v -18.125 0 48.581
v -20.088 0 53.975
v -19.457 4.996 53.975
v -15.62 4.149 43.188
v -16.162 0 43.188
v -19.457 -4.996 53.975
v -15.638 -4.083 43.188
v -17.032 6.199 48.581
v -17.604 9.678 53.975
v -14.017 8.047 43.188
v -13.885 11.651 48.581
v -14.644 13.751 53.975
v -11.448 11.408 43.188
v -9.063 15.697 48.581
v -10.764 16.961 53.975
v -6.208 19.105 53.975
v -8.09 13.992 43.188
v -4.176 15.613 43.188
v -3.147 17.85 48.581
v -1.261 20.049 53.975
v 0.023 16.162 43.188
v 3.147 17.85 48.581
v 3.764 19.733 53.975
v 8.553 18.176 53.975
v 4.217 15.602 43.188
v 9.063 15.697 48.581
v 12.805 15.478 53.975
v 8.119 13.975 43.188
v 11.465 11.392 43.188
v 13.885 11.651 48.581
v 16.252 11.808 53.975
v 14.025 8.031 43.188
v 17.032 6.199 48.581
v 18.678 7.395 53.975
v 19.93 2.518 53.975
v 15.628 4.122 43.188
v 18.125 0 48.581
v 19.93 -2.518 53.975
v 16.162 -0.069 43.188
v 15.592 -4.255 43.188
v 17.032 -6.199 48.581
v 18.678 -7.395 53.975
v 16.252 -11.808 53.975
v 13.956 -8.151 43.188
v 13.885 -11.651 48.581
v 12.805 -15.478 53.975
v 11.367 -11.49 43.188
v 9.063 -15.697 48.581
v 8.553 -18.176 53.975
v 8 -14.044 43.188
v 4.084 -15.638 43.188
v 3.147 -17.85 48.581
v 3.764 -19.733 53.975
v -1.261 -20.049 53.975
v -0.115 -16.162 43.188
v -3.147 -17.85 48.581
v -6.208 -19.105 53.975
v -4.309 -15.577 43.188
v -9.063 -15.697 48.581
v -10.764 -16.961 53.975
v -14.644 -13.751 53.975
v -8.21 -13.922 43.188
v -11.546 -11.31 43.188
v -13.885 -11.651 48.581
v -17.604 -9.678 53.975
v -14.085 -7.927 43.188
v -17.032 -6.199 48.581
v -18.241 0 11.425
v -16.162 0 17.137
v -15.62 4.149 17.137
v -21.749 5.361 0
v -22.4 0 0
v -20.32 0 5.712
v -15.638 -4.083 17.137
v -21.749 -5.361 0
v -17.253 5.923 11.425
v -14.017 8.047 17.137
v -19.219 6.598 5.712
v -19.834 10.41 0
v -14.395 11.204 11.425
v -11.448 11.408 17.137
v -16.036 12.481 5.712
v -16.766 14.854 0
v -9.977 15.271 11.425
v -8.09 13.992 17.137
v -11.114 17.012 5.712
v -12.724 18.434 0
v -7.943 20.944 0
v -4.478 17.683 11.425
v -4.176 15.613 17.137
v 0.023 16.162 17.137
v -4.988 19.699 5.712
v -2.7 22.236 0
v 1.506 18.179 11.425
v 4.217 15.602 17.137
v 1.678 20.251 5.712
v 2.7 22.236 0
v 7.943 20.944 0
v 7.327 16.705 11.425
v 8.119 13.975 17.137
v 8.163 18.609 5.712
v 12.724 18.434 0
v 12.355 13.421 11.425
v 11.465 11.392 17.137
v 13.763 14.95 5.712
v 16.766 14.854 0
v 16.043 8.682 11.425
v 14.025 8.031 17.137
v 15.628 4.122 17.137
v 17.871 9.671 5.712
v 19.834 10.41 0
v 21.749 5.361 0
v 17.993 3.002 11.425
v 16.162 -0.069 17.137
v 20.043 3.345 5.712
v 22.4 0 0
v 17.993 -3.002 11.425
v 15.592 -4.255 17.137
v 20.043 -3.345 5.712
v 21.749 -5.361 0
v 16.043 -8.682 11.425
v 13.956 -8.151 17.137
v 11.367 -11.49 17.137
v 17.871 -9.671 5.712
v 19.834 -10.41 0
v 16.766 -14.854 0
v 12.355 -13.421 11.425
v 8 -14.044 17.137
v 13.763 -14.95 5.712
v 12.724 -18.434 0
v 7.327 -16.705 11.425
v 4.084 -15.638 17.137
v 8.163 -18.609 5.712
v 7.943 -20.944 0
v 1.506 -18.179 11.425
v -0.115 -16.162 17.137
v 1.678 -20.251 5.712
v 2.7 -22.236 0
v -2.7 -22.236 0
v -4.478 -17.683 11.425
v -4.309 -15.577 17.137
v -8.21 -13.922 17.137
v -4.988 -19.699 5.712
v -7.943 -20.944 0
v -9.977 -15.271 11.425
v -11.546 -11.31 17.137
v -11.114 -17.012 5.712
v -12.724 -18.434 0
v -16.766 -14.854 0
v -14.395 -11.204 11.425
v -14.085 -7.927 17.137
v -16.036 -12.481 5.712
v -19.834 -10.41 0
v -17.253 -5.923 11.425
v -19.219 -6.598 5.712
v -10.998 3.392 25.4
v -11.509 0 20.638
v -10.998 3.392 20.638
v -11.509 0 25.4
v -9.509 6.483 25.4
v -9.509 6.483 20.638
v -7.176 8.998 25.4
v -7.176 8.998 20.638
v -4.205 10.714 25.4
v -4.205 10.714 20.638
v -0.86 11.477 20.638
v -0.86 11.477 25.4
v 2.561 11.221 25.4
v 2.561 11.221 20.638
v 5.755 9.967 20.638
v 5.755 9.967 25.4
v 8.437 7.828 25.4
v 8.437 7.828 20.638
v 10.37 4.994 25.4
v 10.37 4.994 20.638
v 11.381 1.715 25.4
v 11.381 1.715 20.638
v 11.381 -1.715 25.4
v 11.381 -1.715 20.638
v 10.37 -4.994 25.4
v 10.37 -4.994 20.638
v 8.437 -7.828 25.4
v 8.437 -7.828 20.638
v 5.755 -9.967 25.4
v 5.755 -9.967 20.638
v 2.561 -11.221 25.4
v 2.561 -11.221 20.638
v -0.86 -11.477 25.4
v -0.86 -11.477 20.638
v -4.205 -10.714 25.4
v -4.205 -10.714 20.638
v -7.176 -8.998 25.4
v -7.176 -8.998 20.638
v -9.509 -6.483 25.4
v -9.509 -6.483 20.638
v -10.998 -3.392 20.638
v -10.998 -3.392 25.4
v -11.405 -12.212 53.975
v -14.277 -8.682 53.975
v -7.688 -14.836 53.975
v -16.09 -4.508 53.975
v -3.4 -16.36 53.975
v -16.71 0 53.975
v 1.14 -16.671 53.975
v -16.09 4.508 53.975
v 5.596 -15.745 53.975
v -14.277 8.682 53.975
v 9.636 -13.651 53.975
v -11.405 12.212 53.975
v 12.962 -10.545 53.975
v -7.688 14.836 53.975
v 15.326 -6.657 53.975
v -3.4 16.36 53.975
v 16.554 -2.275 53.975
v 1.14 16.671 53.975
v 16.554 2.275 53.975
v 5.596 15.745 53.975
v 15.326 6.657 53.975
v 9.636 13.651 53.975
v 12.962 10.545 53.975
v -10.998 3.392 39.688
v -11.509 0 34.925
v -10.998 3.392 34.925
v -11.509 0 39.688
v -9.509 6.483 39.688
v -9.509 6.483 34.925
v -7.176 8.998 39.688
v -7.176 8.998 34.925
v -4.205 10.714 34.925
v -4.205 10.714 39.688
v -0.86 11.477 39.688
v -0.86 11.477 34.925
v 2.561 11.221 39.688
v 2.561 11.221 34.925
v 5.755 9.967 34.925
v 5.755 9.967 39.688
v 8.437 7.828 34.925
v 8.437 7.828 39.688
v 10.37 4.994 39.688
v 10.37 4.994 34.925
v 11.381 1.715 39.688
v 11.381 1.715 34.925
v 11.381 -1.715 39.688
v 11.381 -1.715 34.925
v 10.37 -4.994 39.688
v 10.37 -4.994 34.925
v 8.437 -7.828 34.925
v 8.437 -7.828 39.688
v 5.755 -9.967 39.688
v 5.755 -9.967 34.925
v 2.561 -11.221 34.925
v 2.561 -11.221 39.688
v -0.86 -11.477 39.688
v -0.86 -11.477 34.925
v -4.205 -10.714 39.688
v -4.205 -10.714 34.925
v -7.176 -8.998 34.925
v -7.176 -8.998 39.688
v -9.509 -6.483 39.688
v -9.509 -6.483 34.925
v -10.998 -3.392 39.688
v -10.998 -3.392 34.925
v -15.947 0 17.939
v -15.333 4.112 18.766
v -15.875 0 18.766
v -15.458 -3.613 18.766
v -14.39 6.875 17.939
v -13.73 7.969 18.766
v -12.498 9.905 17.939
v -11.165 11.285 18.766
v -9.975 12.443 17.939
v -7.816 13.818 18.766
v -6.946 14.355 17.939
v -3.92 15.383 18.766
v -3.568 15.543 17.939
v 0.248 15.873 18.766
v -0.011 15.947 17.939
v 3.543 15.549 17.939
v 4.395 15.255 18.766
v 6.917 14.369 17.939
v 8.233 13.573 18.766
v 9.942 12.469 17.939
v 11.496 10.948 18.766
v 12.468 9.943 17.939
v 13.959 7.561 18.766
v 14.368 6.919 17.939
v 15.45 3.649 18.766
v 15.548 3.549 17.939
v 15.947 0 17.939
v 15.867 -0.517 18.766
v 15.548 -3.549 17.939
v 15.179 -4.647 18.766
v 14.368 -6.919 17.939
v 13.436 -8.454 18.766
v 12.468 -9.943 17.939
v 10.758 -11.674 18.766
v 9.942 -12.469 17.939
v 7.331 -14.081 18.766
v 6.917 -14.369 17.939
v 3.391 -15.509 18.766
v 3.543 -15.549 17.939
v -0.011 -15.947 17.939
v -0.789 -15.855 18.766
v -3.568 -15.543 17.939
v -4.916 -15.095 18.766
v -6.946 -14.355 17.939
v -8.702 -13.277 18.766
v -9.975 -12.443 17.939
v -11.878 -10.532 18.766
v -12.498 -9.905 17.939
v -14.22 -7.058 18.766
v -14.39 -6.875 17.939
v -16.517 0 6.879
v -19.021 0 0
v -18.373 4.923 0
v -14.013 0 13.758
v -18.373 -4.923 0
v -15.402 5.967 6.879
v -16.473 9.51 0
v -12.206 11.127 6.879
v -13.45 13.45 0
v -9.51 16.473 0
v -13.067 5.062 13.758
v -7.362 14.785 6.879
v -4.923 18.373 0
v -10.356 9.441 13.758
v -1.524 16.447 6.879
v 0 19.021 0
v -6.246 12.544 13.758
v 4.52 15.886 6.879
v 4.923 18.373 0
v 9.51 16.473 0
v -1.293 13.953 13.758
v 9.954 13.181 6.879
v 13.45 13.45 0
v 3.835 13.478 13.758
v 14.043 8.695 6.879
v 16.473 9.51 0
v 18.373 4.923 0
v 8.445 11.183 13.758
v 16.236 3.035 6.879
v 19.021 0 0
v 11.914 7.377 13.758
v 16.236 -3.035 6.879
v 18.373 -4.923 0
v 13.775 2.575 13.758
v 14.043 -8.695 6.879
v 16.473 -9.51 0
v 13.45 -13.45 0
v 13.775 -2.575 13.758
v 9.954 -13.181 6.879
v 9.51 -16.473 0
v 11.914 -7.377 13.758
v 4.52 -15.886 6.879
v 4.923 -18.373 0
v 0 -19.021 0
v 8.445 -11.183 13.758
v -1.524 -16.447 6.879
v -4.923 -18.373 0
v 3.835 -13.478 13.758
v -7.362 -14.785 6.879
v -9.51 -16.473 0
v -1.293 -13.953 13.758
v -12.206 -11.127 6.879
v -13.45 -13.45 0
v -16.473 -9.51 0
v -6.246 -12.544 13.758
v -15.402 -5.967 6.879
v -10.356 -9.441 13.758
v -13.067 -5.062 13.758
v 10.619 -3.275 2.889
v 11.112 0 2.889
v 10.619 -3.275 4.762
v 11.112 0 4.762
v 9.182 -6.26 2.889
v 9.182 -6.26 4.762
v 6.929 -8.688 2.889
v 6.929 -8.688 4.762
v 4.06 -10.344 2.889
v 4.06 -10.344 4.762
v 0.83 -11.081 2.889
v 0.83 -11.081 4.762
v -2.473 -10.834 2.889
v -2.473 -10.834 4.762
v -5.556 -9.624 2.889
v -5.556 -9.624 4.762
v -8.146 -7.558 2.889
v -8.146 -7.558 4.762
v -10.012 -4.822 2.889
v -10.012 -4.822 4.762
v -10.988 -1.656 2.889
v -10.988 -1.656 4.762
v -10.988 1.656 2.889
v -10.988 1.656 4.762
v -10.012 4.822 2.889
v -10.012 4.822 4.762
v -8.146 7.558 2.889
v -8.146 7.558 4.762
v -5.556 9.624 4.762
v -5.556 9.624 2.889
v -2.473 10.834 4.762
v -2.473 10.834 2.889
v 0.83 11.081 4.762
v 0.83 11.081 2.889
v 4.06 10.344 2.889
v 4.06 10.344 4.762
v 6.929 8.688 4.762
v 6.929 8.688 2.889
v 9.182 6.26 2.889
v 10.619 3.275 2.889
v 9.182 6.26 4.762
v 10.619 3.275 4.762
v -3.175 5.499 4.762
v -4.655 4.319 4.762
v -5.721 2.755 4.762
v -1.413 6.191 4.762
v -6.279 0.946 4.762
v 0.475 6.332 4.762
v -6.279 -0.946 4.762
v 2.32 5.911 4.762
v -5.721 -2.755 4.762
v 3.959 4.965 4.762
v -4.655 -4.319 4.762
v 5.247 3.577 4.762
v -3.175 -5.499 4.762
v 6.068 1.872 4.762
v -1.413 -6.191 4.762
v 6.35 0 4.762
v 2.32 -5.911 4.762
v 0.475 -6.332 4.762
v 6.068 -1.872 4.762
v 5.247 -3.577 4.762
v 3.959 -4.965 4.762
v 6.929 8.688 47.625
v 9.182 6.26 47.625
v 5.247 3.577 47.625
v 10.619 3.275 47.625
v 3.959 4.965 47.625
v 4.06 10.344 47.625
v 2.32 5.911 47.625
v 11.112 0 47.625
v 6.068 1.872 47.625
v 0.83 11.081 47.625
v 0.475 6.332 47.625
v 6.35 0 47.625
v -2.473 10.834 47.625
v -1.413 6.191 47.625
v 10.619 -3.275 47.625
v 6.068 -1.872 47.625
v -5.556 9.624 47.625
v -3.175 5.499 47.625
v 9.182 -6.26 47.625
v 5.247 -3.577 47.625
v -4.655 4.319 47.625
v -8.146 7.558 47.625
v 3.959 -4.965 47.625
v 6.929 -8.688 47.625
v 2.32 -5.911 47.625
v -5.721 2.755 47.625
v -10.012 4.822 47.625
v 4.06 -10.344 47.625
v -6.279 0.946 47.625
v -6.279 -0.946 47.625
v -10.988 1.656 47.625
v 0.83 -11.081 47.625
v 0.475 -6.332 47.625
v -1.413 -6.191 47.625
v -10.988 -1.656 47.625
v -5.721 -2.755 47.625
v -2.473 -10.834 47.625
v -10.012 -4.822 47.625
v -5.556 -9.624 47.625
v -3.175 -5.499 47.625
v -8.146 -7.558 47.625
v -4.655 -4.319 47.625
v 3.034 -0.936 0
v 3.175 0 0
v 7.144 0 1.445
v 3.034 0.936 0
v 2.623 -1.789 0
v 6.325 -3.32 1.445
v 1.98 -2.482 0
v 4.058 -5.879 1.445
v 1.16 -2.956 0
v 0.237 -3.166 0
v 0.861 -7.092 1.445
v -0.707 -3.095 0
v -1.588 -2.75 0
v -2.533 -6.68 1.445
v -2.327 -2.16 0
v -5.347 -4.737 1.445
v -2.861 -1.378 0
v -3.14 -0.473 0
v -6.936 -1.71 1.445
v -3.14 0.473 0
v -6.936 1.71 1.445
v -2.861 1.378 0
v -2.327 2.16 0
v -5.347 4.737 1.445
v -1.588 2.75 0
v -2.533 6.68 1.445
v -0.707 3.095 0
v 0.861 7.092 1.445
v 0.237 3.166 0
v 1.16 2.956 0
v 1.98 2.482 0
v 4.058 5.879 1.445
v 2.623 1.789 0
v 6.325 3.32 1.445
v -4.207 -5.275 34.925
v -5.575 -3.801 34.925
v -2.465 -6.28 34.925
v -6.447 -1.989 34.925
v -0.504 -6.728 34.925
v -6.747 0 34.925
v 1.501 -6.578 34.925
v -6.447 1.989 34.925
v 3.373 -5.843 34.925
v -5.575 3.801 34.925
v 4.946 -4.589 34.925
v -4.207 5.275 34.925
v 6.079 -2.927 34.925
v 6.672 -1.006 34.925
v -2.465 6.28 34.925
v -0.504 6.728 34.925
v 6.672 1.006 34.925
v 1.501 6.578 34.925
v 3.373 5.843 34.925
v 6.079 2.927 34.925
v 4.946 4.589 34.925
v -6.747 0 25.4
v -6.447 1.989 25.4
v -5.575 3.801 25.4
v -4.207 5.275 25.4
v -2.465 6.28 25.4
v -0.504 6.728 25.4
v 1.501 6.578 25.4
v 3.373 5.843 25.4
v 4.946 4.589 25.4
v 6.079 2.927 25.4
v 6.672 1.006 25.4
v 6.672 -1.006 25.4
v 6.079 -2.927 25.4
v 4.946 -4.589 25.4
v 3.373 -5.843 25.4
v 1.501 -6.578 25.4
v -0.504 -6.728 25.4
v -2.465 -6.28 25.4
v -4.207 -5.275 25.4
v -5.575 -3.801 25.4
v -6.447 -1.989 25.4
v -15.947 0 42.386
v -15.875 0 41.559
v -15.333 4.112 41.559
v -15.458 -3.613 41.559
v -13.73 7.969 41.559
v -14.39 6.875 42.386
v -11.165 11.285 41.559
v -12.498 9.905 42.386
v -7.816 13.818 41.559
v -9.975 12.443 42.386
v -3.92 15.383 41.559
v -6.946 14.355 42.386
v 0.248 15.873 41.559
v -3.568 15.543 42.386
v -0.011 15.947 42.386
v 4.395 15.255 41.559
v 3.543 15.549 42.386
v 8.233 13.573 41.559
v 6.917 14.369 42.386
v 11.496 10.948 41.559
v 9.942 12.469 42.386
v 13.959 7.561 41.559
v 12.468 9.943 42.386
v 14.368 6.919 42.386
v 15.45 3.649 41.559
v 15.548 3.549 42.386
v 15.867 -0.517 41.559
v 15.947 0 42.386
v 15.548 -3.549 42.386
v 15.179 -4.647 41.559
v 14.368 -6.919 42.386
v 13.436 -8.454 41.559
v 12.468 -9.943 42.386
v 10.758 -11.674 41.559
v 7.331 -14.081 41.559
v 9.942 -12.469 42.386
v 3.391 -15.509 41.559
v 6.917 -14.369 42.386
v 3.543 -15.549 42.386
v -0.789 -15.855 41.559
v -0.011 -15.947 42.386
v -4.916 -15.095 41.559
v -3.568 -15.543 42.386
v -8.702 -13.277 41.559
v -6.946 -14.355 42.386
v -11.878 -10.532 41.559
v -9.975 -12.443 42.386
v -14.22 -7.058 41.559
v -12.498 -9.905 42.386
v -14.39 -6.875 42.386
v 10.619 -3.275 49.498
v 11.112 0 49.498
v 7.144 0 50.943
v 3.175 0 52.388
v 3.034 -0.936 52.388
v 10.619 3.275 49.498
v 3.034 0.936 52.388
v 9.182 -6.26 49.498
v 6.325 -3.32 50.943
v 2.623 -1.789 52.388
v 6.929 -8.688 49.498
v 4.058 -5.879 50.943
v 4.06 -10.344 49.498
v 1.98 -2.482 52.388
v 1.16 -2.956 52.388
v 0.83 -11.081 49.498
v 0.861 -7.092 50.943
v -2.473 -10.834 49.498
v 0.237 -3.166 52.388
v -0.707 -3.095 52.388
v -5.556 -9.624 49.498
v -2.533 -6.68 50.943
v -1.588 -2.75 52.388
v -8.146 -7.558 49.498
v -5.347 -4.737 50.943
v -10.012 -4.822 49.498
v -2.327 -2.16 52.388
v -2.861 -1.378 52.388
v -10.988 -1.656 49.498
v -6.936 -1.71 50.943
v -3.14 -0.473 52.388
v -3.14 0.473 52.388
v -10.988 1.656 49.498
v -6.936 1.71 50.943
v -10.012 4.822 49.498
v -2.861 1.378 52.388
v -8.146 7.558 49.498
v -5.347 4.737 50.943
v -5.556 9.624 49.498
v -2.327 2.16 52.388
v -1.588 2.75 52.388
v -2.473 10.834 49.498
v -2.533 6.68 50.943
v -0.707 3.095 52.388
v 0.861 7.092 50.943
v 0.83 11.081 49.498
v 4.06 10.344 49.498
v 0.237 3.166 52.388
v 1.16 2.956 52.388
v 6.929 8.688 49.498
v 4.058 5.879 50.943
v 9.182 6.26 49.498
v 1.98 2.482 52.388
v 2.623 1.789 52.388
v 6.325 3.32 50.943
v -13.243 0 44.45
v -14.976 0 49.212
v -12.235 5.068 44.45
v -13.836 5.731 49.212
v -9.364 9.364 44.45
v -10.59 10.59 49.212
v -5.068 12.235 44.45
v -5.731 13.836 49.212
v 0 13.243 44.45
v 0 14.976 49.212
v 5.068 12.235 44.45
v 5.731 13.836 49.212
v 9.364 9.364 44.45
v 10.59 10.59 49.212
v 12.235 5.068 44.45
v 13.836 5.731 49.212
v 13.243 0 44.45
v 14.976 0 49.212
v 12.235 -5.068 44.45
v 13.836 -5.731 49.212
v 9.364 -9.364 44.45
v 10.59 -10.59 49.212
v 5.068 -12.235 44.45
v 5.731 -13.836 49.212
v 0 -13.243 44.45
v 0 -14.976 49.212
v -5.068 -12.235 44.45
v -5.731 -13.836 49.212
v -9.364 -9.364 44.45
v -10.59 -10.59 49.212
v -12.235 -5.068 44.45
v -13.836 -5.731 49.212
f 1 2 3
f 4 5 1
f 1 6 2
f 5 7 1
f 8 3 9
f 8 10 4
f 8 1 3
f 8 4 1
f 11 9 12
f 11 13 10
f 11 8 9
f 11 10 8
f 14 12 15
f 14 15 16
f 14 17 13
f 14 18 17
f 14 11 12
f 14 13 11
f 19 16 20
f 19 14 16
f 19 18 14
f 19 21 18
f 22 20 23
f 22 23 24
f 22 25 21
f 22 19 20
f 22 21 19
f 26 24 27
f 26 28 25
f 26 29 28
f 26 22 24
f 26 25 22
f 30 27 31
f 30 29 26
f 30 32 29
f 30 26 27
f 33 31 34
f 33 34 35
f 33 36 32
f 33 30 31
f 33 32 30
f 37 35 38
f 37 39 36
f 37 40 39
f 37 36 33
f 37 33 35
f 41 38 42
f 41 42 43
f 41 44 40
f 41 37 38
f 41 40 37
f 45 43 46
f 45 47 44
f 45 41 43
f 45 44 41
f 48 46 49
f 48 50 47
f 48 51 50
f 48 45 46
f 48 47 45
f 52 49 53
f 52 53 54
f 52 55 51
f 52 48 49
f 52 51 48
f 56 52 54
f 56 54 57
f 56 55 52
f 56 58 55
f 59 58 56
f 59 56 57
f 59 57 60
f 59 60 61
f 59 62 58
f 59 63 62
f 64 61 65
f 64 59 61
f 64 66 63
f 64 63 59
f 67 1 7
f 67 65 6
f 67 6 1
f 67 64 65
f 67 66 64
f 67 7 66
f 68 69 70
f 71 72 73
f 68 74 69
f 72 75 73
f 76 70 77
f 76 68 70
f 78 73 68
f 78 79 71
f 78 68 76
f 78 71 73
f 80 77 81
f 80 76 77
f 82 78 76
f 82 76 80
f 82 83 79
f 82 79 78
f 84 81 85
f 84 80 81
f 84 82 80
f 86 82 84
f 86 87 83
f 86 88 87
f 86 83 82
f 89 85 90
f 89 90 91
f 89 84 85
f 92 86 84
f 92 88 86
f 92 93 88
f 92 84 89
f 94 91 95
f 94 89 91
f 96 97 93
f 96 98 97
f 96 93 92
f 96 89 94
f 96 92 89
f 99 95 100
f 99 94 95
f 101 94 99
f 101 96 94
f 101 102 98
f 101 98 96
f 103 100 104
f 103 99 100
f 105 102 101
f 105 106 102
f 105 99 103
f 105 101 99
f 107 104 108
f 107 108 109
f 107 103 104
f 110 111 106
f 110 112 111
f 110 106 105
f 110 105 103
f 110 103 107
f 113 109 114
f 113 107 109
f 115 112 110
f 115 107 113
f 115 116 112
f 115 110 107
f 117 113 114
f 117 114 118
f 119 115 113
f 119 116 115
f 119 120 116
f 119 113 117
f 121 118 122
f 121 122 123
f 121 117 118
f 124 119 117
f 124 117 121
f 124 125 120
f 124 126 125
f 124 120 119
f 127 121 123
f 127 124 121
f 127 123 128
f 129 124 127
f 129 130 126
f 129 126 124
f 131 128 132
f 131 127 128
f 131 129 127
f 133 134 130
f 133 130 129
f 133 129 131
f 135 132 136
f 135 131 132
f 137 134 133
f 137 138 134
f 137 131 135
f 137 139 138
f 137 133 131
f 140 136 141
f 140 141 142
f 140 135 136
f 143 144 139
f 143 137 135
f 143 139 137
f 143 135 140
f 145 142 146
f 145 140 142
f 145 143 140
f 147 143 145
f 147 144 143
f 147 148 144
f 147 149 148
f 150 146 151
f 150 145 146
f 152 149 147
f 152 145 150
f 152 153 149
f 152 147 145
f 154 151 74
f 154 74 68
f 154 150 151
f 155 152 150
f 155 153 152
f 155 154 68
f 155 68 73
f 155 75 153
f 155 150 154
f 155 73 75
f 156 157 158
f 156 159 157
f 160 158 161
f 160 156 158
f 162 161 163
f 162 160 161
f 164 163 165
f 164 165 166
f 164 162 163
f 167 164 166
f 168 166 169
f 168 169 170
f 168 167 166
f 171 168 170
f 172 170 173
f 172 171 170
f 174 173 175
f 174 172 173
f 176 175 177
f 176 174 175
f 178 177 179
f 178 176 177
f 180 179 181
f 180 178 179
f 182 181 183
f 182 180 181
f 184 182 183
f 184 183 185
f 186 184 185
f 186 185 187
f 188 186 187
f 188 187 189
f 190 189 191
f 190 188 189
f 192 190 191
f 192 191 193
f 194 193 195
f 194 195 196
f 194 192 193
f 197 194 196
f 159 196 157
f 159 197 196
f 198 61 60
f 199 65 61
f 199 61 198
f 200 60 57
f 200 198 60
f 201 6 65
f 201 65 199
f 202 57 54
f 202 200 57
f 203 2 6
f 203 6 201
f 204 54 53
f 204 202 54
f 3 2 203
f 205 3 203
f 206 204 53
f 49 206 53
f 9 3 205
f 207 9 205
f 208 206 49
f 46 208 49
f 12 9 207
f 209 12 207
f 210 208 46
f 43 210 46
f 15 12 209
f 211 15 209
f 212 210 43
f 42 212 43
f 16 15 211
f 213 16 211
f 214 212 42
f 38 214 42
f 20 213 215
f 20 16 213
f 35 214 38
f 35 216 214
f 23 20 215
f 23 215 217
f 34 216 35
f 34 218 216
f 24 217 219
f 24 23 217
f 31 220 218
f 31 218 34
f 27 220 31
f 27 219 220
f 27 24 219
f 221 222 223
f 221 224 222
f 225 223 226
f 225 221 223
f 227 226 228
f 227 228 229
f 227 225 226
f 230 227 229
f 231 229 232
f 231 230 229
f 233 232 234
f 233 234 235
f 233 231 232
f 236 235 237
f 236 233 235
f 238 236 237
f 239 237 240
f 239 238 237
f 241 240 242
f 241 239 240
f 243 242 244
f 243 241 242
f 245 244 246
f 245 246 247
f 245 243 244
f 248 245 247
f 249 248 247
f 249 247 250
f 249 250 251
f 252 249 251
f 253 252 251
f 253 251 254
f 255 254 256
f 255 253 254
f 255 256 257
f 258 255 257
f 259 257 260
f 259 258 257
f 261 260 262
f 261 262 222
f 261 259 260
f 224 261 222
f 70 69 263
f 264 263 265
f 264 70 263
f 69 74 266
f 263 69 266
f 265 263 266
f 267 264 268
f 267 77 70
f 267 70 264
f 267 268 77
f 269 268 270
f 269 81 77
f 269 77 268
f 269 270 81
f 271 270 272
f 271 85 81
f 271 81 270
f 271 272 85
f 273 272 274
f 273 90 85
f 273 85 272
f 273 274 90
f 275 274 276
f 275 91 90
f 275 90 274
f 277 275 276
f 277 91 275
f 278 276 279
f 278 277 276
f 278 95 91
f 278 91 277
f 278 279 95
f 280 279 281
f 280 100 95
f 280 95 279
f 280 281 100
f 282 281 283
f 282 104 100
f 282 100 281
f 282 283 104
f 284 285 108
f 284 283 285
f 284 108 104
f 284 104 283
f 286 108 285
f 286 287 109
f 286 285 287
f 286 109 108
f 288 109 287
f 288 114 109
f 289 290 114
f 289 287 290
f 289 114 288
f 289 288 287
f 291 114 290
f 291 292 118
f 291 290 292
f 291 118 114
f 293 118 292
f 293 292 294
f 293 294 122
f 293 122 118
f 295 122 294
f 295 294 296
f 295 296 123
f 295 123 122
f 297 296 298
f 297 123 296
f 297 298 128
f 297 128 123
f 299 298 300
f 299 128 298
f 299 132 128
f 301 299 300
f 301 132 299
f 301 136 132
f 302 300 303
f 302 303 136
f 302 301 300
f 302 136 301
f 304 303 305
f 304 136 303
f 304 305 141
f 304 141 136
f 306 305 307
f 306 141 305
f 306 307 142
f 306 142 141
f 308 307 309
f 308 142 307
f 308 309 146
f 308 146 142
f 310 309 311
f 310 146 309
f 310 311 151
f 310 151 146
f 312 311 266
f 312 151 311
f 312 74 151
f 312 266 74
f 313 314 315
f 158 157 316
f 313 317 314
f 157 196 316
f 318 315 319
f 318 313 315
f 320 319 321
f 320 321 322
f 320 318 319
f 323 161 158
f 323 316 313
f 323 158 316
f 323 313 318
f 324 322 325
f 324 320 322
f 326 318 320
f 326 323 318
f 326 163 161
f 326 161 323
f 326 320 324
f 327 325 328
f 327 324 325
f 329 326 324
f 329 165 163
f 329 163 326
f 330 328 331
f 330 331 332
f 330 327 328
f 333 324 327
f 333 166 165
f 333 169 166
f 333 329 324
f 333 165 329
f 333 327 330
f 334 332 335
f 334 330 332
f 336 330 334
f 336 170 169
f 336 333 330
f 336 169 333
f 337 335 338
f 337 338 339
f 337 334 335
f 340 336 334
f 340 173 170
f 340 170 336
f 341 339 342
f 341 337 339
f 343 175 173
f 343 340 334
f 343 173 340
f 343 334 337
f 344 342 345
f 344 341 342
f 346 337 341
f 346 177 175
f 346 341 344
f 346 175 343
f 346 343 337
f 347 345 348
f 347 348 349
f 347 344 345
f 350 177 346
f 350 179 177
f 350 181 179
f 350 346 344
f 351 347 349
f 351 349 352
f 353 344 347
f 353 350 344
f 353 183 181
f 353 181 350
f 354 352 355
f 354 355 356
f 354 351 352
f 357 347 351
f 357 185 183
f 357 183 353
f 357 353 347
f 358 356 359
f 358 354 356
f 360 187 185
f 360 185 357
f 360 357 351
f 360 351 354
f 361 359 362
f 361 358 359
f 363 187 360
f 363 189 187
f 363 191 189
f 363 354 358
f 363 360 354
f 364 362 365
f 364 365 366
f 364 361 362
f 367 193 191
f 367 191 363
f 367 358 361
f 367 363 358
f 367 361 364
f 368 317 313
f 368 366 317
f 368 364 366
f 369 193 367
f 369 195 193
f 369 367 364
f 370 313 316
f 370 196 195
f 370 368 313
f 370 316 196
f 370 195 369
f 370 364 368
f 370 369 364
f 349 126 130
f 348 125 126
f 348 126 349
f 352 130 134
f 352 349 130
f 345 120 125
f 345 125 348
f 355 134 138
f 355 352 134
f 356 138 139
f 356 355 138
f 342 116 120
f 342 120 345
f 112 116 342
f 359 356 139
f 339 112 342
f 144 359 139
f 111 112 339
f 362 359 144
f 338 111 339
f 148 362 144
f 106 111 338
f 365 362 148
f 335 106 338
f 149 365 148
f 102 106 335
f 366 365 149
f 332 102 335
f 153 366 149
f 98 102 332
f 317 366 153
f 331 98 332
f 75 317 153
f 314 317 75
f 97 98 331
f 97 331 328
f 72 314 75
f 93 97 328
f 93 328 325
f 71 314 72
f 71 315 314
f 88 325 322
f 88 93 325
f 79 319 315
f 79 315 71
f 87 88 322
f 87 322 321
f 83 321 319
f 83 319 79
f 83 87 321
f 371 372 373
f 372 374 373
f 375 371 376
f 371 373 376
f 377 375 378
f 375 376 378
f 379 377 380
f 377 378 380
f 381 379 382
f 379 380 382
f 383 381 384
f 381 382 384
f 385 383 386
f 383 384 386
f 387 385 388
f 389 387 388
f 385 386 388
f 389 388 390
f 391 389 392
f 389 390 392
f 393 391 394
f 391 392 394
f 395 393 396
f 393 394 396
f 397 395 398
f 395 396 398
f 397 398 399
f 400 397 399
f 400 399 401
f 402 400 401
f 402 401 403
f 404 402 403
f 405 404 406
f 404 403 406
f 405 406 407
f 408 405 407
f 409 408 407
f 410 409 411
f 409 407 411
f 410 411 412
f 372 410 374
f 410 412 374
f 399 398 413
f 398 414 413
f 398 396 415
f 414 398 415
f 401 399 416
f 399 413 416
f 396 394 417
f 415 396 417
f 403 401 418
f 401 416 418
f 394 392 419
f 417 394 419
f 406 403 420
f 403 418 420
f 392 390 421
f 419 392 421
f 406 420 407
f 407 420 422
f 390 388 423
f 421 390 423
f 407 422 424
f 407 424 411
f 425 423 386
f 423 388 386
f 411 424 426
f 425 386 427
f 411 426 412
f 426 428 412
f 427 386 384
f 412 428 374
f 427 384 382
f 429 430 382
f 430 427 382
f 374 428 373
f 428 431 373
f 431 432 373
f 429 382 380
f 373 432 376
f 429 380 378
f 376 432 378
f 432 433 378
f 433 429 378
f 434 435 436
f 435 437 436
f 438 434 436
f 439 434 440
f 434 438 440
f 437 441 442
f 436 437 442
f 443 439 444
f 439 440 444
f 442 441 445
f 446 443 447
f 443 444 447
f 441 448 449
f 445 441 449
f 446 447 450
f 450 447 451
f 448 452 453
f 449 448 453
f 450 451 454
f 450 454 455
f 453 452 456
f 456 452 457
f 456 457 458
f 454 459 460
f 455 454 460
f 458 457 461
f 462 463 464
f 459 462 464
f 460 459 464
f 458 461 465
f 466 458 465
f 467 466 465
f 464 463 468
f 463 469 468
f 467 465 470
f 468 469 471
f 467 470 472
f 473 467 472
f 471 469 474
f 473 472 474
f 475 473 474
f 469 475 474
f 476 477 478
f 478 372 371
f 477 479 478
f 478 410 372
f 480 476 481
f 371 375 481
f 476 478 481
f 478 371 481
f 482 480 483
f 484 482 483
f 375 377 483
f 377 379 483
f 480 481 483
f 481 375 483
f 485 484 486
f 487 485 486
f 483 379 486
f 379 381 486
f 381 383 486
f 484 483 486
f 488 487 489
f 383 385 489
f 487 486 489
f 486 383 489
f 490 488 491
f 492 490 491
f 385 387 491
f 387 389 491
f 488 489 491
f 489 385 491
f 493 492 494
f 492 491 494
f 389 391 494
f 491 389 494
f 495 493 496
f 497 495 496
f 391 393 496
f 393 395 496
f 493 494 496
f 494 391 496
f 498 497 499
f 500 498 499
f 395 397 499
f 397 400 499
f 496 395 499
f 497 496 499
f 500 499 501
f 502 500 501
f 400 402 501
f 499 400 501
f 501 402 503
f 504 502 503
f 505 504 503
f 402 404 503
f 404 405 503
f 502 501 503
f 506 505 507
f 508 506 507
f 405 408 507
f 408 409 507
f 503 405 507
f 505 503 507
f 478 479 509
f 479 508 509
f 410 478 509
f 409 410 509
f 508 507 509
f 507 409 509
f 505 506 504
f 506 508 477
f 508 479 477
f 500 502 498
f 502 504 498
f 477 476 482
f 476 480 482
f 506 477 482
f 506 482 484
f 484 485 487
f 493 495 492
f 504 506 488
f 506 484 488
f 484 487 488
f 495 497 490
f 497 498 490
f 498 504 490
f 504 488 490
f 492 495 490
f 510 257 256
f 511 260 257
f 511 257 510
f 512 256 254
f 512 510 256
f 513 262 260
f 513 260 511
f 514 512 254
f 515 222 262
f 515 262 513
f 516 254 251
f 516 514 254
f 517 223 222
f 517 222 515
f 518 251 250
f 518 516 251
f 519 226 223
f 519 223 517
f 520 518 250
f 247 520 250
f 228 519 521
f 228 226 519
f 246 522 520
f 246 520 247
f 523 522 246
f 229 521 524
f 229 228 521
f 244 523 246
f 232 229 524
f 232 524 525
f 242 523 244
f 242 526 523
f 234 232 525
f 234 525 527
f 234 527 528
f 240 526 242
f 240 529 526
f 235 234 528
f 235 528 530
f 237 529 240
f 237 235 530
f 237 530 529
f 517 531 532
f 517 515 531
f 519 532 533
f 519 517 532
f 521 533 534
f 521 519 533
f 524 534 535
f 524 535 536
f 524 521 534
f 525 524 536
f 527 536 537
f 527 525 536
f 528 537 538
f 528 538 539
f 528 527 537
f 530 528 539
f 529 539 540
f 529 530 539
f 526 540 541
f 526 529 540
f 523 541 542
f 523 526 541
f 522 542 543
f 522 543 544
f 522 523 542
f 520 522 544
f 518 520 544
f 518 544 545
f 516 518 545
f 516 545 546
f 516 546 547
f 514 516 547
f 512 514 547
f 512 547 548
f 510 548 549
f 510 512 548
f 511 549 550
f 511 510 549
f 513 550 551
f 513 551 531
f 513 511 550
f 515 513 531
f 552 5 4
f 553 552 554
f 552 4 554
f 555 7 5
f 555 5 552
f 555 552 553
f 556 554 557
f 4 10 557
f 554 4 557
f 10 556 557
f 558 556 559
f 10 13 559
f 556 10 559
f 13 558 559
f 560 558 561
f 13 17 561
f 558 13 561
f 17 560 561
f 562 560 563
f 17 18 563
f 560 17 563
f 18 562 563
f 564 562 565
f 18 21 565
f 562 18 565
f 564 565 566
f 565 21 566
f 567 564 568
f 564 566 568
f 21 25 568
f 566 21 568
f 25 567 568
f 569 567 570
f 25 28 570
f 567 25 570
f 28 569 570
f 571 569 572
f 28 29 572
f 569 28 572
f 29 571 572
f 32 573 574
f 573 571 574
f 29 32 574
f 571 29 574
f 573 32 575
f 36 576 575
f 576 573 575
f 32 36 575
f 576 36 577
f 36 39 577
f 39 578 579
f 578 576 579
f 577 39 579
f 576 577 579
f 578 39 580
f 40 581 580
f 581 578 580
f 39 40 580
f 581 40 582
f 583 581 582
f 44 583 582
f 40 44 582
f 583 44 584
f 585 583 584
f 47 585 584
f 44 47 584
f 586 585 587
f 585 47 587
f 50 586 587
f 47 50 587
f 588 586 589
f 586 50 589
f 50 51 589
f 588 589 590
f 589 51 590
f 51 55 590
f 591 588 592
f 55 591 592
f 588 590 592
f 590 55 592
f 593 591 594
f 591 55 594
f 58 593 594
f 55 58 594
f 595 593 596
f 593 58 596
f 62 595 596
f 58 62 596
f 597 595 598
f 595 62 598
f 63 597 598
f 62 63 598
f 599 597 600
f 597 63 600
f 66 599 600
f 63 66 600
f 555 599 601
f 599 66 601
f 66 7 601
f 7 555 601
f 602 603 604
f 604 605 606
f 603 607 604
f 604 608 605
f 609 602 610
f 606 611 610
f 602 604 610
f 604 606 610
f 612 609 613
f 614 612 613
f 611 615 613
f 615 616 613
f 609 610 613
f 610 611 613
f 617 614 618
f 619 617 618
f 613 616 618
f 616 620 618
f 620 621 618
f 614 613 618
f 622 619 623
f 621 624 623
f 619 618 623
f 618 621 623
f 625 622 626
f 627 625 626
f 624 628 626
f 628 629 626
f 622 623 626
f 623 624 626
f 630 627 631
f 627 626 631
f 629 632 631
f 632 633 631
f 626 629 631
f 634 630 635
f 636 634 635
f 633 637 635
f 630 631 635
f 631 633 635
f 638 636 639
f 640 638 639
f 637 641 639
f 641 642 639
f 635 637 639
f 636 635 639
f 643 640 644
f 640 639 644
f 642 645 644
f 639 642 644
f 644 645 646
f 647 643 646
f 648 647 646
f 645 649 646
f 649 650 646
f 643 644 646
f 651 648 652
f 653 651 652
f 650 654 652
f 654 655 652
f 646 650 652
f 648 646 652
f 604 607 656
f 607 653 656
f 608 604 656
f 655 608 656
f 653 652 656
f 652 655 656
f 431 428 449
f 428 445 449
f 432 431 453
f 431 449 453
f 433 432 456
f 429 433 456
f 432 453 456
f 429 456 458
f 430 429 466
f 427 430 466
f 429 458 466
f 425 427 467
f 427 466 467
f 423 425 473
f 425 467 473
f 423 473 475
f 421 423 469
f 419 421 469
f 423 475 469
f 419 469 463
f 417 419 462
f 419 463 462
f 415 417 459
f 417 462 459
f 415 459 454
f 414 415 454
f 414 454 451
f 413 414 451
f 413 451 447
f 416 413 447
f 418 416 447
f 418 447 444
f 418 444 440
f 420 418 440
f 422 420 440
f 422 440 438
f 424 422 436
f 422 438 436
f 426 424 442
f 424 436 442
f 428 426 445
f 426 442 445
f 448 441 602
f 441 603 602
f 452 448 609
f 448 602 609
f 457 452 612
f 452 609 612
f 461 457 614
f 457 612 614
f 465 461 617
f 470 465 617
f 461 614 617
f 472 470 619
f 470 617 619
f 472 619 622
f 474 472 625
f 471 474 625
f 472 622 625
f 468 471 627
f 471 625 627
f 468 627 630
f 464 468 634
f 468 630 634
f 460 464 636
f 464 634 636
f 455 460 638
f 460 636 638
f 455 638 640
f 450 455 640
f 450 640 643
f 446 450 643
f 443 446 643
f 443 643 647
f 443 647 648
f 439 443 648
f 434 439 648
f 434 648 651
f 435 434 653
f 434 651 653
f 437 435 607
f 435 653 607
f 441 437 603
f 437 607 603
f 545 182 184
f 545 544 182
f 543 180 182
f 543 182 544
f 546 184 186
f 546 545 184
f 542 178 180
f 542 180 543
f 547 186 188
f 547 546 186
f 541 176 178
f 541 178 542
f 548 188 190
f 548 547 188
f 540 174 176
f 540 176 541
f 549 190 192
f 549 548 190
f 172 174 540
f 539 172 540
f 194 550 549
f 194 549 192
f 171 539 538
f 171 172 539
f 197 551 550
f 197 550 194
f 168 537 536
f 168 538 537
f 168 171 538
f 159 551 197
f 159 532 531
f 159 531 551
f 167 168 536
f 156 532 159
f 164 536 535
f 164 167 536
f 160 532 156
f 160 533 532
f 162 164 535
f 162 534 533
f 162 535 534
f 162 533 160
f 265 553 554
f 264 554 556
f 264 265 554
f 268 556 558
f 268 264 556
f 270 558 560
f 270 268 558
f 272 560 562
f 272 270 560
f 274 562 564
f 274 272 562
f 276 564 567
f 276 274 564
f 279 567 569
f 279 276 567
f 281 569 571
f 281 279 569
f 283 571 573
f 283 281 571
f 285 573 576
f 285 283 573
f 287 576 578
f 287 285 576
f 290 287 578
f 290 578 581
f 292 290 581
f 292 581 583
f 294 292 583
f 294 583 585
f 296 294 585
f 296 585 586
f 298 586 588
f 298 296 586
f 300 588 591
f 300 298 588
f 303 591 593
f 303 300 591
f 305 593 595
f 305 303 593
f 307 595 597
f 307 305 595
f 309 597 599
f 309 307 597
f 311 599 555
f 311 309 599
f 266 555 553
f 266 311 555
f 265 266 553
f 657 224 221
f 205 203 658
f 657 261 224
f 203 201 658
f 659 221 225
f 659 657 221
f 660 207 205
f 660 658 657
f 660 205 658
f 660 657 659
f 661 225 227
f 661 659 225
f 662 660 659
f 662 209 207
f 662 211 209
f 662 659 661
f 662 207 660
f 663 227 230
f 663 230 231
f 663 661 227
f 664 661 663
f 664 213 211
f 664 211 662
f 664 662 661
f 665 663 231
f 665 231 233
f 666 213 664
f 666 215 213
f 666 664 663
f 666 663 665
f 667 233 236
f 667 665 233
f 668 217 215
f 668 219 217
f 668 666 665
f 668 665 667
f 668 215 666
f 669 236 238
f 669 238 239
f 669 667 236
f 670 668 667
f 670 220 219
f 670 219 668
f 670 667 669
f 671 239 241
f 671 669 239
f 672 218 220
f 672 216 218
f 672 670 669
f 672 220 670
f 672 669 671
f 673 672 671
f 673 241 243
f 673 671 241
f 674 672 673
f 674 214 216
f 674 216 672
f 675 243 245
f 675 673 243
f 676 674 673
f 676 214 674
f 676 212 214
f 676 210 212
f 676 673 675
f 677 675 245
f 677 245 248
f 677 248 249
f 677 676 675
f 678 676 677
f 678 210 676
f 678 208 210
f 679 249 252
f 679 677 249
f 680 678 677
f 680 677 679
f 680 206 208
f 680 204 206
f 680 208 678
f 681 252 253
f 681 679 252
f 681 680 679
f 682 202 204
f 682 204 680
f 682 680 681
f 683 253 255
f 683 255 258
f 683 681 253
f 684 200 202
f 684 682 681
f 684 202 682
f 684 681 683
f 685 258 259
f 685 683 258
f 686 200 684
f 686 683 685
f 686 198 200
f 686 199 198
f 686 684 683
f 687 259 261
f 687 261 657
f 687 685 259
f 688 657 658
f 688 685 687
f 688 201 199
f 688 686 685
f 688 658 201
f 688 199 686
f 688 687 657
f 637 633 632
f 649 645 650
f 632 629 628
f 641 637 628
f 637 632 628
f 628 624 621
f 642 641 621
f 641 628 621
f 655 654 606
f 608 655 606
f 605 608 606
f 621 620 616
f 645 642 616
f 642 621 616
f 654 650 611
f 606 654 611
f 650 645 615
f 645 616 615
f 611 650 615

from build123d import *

# Parameters (mm, degrees)
F2_R = 4.7625


with BuildPart() as f1:
    # F0 (on Front) → F1 (revolve)
    with BuildSketch(Plane.XZ):
        Polygon((0, 52.3875), (0, 0), (3.175, 0), (11.1125, 2.889014), (11.1125, 4.7625), (6.35, 4.7625), (6.35, 47.625), (11.1125, 47.625), (11.1125, 49.498486), (3.175, 52.3875), align=None)
        Polygon((-15.875, 17.926123), (-22.399575, 0), (-19.020811, 0), (-11.509375, 20.6375), (-11.509375, 25.4), (-6.746875, 25.4), (-6.746875, 34.925), (-11.509375, 34.925), (-11.509375, 39.6875), (-16.7096, 53.975), (-20.088364, 53.975), (-15.875, 42.398877), align=None)
    revolve(axis=Axis((0, 0, -7.775913), (0, 0, -1)))

    # F2
    f2_edges = [f1.edges().sort_by_distance(p)[0] for p in [
        (15.875, 0, 42.398877),
        (15.875, 0, 17.926123),
    ]]
    fillet(f2_edges, radius=F2_R)


solid = f1.part
